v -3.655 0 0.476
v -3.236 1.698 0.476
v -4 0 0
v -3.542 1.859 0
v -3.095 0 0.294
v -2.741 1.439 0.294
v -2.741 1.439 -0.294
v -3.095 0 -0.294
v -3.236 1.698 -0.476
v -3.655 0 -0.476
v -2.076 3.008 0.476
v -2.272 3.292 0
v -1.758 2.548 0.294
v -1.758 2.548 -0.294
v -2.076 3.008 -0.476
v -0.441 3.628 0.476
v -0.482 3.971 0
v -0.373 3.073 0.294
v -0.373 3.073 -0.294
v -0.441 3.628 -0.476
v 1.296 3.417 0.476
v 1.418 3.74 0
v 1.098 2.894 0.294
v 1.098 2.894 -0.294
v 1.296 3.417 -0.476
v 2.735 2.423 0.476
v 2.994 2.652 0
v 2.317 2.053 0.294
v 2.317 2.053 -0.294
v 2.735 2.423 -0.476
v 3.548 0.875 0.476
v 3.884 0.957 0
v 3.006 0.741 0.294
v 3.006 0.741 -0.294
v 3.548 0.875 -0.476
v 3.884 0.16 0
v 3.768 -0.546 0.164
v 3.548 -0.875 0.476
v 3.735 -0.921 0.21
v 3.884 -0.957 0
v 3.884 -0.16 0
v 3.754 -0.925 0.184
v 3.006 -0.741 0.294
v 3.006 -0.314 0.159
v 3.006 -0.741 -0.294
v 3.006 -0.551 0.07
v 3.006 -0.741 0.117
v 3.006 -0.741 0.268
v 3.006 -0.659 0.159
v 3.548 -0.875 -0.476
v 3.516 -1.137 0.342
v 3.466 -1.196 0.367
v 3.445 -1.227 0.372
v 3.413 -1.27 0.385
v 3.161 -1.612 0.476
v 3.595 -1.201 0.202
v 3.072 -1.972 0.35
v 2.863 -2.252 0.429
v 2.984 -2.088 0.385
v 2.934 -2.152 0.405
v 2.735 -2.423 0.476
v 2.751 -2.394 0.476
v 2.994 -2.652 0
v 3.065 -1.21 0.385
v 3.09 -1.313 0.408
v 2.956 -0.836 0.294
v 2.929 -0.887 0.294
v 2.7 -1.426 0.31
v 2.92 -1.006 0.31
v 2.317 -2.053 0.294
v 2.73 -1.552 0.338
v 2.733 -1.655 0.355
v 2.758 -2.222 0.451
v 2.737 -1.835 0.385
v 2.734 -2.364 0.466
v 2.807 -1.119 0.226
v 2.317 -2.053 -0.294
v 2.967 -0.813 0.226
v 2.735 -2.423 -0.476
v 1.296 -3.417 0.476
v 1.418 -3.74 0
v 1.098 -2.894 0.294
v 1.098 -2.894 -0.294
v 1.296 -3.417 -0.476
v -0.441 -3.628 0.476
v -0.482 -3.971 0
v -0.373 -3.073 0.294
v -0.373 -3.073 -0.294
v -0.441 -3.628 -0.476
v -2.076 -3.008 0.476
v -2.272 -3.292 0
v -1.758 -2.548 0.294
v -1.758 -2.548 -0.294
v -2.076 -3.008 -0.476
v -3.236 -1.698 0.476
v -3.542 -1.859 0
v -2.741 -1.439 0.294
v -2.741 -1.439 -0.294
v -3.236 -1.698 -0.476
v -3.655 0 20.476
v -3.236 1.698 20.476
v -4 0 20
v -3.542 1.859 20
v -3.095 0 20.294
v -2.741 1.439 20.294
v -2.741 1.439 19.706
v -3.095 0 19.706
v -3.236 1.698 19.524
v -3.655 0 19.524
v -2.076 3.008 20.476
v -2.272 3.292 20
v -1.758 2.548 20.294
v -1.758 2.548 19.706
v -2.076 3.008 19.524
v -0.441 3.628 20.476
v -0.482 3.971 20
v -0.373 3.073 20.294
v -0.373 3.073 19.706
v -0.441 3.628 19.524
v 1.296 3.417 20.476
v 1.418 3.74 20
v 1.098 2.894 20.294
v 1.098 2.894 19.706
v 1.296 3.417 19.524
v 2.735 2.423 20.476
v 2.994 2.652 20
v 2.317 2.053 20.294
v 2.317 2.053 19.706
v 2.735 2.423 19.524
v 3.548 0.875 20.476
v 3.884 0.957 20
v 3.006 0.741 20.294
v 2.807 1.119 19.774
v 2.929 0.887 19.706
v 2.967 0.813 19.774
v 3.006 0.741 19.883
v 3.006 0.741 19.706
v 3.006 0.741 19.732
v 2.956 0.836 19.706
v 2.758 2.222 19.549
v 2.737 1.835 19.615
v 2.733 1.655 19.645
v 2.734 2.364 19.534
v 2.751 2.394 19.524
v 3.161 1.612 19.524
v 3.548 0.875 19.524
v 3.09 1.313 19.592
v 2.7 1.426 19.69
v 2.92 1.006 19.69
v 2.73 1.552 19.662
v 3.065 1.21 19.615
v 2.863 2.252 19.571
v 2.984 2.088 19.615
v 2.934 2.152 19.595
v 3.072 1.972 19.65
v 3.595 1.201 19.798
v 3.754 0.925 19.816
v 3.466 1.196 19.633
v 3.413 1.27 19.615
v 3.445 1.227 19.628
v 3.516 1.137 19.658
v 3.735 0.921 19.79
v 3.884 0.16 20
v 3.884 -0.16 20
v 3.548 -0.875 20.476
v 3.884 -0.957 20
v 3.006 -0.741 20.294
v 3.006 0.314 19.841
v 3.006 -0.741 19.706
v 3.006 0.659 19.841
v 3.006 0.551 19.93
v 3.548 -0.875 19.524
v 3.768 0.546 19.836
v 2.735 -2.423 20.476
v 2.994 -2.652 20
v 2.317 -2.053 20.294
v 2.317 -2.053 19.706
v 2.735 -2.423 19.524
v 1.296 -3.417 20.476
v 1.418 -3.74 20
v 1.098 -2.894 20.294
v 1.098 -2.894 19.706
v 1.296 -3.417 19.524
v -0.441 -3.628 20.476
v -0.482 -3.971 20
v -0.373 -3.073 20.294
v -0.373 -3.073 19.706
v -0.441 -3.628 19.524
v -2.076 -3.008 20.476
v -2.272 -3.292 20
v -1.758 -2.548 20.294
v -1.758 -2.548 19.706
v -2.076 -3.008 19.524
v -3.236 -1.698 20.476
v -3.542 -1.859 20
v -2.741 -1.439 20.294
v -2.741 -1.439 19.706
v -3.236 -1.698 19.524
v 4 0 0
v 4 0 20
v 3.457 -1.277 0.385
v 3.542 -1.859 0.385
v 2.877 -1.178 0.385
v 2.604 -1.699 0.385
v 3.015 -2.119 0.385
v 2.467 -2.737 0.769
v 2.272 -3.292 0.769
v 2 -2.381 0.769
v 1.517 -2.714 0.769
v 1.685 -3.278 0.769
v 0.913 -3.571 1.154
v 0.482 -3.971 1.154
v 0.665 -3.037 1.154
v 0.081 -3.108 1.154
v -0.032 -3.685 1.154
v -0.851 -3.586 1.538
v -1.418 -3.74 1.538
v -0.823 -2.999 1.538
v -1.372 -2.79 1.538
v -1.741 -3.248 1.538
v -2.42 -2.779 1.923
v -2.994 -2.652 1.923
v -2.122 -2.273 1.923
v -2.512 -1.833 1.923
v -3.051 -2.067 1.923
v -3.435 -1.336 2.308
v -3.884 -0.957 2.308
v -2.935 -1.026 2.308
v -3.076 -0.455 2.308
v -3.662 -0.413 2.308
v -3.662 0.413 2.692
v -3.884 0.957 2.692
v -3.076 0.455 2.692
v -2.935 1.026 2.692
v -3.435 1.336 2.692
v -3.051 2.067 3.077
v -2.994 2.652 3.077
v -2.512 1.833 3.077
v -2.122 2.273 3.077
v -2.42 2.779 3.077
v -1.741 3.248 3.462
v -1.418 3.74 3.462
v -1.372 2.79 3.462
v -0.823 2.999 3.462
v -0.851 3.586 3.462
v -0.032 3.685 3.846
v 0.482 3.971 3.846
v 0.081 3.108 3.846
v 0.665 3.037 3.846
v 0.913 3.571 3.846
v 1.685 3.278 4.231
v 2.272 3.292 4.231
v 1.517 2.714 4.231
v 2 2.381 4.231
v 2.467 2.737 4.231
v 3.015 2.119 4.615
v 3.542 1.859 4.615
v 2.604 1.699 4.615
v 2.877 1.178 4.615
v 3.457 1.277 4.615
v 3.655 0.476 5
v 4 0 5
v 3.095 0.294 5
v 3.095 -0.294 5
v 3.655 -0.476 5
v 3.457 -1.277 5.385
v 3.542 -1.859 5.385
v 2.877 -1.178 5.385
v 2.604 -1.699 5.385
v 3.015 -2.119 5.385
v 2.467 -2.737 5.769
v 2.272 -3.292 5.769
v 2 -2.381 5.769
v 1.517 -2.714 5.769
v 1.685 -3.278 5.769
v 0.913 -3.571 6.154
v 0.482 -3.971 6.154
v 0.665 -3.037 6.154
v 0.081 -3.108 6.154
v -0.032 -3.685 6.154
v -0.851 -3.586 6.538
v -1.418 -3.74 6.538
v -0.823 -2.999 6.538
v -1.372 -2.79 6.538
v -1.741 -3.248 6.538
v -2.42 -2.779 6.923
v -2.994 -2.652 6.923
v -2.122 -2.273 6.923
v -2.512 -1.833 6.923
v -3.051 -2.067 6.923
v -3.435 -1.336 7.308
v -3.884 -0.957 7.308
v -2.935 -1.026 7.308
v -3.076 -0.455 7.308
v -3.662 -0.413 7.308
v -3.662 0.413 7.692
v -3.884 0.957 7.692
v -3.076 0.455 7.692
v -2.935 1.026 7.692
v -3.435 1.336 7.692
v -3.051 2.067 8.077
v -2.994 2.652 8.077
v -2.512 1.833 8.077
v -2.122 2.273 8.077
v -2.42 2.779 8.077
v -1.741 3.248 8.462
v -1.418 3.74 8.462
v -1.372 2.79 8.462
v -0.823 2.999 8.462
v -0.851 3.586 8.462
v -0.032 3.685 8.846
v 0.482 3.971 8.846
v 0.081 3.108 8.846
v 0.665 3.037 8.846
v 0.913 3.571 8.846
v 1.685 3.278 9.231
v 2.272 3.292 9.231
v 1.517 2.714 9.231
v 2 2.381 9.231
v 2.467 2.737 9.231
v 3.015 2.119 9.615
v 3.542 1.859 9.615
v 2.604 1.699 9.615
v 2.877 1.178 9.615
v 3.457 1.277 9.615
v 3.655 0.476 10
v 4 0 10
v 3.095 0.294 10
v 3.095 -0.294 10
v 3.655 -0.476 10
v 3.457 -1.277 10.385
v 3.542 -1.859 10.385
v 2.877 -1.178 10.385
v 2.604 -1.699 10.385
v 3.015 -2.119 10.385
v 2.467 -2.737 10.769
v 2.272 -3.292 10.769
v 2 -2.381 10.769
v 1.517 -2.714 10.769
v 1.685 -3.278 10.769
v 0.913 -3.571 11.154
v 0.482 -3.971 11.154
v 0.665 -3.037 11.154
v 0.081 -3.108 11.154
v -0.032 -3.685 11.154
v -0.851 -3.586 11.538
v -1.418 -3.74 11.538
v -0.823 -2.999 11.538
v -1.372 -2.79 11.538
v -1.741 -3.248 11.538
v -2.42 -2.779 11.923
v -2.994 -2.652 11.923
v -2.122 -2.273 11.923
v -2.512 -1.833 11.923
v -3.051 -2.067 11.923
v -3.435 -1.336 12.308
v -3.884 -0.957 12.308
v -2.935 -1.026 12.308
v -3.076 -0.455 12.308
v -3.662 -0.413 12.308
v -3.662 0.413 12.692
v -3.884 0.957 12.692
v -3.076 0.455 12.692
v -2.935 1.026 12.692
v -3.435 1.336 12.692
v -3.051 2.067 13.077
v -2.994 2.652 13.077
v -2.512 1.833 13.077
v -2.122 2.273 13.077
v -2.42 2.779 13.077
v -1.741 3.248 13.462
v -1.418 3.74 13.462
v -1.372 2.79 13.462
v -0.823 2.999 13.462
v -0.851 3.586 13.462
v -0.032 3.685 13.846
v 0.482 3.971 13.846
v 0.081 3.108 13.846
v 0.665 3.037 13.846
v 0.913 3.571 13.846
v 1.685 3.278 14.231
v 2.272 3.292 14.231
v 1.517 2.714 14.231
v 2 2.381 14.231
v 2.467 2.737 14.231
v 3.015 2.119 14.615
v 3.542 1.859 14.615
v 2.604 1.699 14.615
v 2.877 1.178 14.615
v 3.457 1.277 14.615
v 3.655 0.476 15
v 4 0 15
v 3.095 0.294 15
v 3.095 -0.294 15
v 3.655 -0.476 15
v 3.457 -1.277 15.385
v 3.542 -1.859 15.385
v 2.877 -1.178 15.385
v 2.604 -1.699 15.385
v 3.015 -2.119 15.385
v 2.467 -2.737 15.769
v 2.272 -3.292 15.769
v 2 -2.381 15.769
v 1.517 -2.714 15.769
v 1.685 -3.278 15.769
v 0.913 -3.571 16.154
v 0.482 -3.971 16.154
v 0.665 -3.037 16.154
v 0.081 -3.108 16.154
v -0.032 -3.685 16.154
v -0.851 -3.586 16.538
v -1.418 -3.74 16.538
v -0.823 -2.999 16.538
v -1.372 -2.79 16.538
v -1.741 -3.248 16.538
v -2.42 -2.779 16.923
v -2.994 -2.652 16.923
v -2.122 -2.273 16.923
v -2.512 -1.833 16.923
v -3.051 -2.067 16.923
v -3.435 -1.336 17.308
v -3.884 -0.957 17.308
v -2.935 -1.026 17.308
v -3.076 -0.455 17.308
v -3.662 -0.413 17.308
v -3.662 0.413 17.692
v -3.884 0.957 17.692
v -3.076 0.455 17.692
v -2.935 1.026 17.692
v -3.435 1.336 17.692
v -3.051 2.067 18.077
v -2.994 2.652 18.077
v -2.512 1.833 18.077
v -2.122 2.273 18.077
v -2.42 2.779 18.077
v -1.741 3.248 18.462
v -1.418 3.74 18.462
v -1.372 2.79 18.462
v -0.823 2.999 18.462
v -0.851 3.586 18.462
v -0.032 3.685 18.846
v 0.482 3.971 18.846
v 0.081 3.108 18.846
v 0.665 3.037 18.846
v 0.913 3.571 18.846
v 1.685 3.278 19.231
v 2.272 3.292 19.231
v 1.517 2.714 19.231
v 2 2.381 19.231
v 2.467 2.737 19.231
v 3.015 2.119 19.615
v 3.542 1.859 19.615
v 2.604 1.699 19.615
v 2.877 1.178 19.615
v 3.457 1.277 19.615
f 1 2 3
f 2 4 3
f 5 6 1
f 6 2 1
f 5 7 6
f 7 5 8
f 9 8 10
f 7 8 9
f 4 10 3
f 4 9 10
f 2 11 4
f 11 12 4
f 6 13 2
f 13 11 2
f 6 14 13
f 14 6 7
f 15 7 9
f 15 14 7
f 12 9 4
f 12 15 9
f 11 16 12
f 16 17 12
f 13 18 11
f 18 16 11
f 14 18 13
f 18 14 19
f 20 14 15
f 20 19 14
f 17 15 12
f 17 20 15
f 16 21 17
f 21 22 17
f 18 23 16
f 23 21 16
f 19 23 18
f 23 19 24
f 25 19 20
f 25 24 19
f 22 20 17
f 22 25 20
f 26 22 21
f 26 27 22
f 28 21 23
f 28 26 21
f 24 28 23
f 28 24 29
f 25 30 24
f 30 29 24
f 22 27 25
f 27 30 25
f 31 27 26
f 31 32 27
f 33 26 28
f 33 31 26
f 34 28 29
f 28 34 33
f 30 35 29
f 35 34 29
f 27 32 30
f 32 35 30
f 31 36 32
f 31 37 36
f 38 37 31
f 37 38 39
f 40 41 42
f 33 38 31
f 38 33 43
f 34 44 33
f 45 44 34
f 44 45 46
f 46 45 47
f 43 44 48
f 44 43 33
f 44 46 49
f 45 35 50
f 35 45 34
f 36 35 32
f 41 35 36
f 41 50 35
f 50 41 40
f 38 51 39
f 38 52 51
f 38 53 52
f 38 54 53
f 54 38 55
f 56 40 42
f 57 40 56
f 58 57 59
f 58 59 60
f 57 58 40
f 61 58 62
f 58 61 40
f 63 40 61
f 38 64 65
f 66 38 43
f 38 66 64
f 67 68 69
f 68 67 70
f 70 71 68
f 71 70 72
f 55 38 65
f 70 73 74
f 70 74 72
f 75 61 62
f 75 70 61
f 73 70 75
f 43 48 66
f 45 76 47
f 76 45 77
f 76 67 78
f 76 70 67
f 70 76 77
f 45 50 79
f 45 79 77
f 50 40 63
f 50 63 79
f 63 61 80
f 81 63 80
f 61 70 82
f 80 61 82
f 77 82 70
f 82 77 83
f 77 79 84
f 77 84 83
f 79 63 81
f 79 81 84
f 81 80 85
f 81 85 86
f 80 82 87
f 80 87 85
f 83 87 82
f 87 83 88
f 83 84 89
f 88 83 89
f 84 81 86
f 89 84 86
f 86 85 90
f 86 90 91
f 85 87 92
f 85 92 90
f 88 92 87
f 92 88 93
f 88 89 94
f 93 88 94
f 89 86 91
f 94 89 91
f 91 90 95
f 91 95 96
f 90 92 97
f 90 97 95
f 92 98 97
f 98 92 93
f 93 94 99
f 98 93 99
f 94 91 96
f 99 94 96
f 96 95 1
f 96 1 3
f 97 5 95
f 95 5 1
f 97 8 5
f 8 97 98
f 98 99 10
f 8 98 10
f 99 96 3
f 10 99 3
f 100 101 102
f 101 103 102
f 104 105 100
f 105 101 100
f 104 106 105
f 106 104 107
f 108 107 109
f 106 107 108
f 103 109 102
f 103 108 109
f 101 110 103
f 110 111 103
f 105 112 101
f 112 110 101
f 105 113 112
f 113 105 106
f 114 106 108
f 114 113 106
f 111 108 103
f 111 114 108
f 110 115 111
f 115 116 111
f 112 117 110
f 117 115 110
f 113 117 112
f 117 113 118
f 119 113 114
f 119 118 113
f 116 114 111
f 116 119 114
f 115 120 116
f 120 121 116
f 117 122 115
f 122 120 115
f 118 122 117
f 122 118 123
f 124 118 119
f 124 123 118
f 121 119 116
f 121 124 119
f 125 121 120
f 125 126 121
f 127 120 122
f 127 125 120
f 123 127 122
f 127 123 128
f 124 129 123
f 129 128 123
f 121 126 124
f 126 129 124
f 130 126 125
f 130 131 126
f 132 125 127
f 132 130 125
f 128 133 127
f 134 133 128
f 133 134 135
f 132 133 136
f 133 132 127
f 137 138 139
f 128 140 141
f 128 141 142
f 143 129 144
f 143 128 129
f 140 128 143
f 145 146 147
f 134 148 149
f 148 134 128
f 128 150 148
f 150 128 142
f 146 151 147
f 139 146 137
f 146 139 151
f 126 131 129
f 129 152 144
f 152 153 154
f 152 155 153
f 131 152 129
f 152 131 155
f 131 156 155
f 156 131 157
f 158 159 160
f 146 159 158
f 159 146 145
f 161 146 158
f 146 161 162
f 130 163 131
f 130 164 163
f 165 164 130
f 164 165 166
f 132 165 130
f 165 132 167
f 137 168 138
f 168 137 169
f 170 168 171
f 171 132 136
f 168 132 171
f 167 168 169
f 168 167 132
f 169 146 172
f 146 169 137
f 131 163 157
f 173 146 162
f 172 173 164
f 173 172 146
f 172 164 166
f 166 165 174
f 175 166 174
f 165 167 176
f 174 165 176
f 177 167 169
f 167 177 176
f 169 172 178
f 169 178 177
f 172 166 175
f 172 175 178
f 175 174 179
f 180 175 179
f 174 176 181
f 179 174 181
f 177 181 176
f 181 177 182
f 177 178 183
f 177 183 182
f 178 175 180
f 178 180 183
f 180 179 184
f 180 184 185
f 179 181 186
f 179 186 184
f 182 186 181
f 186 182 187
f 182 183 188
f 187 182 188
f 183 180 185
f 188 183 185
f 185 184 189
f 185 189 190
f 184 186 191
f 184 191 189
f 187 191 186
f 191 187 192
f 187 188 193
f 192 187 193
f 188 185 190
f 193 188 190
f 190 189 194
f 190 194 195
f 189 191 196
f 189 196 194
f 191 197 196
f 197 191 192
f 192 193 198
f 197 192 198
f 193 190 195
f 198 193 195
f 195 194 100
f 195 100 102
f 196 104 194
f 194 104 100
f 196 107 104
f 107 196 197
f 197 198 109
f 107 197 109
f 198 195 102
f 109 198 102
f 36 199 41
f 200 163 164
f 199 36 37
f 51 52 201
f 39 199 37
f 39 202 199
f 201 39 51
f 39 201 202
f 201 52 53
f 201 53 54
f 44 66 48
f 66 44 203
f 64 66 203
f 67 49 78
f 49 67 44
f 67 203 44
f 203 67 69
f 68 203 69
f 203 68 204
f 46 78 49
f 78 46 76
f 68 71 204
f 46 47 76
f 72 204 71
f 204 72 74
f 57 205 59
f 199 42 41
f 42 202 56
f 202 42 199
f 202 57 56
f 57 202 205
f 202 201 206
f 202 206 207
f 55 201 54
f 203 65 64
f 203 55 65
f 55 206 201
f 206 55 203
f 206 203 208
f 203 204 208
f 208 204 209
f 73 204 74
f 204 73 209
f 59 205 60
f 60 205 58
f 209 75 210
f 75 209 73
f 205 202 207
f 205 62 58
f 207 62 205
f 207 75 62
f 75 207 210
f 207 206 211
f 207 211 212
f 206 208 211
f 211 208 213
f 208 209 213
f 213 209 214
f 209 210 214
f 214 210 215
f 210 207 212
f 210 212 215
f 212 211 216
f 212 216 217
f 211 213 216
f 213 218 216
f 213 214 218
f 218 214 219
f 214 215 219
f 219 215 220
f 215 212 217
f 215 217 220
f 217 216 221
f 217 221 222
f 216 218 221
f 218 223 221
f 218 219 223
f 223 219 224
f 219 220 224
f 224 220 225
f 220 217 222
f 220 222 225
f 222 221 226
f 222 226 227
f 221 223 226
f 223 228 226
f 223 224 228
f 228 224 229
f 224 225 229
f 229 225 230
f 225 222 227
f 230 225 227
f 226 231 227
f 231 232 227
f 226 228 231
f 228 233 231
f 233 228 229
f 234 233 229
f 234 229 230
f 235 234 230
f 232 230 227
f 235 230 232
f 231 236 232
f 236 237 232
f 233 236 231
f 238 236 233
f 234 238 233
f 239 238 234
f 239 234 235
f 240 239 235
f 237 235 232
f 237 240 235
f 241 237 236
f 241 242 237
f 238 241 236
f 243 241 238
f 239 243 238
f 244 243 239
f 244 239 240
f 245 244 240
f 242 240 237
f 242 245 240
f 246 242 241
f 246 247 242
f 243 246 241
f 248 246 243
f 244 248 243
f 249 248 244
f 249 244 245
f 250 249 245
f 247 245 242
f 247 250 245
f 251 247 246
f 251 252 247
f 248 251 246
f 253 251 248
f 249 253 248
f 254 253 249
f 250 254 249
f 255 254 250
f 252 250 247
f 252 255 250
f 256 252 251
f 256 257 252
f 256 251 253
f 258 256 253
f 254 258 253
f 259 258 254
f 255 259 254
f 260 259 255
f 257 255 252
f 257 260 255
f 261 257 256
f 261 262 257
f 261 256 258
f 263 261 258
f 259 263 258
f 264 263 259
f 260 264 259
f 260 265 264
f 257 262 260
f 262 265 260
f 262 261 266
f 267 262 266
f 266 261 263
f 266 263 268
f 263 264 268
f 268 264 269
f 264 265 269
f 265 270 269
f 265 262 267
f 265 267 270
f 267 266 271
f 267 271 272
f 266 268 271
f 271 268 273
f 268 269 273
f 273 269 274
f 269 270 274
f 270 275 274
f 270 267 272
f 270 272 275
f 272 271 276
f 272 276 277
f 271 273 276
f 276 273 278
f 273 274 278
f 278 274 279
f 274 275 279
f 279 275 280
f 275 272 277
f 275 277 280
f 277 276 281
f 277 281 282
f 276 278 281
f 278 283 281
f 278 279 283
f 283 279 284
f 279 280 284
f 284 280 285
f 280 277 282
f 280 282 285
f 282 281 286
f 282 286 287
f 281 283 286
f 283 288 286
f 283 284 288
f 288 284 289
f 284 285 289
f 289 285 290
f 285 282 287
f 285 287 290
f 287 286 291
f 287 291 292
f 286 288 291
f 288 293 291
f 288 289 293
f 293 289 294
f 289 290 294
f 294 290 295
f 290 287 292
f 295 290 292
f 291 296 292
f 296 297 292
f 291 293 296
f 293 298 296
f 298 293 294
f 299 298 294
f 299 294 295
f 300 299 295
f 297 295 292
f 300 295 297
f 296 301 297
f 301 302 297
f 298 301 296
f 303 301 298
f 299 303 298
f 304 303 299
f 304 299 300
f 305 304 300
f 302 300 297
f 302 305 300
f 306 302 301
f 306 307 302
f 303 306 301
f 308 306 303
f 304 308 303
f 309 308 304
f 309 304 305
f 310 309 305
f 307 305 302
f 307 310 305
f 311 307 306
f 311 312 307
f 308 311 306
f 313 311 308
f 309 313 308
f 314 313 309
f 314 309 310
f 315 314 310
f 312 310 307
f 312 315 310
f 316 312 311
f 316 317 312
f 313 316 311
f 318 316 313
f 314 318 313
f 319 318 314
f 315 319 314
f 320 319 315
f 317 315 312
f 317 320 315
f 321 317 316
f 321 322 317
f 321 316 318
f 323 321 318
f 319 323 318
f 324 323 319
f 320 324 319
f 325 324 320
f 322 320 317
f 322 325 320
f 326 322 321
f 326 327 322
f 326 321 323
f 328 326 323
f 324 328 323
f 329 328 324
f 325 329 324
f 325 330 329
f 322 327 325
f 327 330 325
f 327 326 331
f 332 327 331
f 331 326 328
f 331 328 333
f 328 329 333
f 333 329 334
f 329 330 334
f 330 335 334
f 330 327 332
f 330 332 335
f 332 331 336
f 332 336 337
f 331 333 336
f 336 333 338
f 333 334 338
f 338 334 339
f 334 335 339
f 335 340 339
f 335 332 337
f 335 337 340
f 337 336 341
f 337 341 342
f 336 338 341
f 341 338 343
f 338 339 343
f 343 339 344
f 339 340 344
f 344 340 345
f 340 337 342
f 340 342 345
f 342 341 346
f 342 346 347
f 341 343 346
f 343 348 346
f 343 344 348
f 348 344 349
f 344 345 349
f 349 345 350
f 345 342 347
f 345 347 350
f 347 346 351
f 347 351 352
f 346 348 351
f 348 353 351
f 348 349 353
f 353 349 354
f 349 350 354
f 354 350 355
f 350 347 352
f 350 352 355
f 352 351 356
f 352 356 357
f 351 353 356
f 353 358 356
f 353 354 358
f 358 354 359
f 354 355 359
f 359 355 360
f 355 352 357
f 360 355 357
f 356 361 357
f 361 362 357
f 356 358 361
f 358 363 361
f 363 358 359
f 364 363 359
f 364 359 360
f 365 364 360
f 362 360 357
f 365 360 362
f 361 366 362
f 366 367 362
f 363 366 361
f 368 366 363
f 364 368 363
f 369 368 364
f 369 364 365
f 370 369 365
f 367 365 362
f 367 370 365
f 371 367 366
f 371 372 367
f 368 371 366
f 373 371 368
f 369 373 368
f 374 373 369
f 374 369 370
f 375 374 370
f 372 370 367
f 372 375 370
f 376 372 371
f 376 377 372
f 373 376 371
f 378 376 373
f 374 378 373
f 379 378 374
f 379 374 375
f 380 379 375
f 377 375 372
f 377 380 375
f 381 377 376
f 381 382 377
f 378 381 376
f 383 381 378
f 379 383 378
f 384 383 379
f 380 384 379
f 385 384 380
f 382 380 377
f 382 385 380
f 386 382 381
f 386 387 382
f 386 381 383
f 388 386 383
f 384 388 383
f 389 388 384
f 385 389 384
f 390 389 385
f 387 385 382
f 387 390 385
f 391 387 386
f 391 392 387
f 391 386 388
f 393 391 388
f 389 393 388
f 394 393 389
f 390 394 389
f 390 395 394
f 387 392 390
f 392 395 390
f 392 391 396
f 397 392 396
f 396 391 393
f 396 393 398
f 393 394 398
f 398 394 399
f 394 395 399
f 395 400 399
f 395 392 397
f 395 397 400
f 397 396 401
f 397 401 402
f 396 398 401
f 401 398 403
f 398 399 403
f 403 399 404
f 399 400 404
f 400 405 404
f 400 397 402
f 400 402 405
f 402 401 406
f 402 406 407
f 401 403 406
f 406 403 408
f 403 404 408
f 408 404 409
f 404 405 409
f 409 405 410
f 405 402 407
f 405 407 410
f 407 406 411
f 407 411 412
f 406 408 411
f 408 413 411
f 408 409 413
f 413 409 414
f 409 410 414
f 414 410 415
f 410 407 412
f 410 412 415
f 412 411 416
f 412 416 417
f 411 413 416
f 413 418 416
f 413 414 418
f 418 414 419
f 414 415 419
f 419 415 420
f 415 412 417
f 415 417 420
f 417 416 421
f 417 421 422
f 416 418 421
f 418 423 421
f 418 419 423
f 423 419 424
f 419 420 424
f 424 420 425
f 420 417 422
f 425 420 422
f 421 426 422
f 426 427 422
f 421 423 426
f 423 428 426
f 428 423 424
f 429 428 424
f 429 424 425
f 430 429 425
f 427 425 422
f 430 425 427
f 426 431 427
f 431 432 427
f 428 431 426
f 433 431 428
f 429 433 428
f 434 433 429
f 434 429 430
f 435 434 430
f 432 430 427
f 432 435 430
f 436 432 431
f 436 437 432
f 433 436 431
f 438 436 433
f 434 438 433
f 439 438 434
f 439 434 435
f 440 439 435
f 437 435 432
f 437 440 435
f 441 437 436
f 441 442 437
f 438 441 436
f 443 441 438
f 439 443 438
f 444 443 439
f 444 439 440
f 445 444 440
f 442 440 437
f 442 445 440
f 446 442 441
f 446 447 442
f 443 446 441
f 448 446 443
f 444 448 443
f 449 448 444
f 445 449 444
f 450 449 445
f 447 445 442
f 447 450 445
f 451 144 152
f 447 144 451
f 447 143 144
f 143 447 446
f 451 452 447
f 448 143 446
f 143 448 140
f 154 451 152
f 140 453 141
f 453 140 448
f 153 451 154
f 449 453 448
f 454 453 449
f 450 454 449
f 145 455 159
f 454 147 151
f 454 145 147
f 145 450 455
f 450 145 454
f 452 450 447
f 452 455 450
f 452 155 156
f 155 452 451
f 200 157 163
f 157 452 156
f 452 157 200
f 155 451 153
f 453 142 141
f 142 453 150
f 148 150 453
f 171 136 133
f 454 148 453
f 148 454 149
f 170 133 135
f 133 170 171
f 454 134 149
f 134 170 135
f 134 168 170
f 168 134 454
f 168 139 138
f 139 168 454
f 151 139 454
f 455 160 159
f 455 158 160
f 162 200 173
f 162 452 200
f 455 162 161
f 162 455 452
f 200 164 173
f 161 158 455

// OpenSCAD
function create_spring_dims(ID, OD, length, wire_dia=1, revs=5) = [ID, OD, length, wire_dia, revs];

module spring(ID, OD, length, wire_dia, revs=4) {
    
    color("red")
    union(){

        linear_extrude(length, twist=360*revs)
        translate([(OD+ID)/4,0,0])
        circle(wire_dia/2);

        for (i = [0:1]) {
            translate([0,0,i*length])
            rotate_extrude()
            translate([(OD+ID)/4,0,0])
            circle(wire_dia/2);
        }

    }
}
spring(6,8,20,1);
